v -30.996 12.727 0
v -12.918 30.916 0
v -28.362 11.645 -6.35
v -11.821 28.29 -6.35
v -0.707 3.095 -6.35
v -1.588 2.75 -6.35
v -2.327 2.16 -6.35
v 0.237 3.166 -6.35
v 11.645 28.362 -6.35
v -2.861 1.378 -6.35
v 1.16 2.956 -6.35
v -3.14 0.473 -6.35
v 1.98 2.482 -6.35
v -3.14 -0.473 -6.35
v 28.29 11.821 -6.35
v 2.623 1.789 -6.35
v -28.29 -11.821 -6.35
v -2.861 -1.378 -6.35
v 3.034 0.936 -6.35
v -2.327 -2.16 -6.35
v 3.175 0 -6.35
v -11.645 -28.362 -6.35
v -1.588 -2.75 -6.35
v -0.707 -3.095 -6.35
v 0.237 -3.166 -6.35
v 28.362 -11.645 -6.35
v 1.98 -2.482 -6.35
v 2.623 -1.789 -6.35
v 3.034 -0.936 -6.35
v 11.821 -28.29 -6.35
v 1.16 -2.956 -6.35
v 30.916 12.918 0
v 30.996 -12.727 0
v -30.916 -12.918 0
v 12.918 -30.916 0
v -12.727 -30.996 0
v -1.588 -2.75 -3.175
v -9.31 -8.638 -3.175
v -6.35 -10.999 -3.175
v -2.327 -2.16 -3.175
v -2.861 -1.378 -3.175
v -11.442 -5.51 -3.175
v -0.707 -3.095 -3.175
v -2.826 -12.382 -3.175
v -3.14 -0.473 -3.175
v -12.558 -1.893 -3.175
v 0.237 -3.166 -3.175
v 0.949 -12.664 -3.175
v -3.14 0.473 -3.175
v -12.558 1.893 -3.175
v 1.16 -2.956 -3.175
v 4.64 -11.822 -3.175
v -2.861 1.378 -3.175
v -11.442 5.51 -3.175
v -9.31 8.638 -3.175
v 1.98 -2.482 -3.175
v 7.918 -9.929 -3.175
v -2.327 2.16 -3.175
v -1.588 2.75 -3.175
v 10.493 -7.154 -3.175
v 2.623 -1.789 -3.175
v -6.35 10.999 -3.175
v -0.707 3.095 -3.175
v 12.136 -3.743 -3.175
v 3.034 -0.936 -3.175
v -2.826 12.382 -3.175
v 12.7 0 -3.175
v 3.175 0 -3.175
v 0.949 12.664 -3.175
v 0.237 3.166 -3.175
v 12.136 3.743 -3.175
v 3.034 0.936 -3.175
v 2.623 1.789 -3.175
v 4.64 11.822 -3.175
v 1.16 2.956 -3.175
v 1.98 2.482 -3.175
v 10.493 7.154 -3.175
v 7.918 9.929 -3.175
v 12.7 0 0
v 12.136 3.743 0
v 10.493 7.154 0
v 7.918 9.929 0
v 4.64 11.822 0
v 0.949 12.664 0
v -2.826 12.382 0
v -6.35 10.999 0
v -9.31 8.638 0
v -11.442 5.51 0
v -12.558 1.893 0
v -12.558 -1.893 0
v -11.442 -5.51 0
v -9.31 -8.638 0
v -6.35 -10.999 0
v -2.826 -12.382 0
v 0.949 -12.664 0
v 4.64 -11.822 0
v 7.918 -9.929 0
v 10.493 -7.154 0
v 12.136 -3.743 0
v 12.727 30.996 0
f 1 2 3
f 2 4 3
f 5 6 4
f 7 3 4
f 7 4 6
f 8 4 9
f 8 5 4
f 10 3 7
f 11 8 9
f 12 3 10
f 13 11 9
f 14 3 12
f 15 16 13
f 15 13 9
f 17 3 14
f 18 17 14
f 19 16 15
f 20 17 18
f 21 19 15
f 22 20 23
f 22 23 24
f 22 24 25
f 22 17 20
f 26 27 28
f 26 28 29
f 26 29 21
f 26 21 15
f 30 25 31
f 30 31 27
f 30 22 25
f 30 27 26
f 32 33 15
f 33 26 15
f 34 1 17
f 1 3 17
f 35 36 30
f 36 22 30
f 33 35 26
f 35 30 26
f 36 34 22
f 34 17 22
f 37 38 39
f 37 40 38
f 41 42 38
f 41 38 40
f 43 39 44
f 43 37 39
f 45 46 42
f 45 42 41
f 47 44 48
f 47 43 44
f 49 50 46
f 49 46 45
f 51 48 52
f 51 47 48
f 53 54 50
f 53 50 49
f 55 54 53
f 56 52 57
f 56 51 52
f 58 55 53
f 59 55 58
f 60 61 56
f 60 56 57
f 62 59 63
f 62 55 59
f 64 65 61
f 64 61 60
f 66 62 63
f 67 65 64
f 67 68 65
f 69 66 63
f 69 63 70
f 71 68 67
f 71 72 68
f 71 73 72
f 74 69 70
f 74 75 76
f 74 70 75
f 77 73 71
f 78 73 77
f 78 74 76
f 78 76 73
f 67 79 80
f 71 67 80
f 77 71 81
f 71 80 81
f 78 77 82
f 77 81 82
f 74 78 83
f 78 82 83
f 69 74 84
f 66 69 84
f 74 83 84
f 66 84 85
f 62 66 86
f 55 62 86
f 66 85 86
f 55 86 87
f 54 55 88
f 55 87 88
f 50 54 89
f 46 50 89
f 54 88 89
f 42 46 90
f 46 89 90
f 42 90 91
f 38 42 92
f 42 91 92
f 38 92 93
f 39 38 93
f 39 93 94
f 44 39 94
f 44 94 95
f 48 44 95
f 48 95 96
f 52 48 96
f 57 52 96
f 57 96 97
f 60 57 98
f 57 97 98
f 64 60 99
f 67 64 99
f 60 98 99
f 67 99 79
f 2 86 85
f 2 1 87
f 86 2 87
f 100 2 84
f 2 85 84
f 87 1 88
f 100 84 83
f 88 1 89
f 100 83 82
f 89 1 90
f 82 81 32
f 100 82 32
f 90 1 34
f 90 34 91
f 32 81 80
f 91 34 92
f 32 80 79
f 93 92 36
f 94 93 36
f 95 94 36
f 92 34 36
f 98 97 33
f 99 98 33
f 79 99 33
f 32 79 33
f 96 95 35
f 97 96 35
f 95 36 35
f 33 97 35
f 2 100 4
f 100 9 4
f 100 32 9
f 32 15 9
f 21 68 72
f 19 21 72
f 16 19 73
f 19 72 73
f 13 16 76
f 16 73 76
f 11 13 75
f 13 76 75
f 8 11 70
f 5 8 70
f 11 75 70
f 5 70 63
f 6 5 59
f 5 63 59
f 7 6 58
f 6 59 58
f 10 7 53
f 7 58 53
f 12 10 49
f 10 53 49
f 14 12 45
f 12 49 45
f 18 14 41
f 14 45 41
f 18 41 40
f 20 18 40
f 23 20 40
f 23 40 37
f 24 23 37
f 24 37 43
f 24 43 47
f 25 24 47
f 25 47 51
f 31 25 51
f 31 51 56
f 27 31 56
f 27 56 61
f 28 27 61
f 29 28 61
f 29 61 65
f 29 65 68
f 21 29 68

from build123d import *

# Parameters (mm, degrees)
F1_DEPTH = 6.35
F1_TAPER = 22.5
F2_R     = 12.7
F3_DEPTH = 3.175
F4_R     = 3.175
F5_DEPTH = 25.4


with BuildPart() as f1:
    # F0 (on Top) → F1 (new body)
    with BuildSketch(Plane.XY):
        Polygon((-30.9957823292, 12.7266398535), (-30.9164212153, -12.9182345311), (-12.7266398535, -30.9957823292), (12.9182345311, -30.9164212153), (30.9957823292, -12.7266398535), (30.9164212153, 12.9182345311), (12.7266398535, 30.9957823292), (-12.9182345311, 30.9164212153), align=None)
    extrude(amount=-F1_DEPTH, taper=F1_TAPER)

    # F2 (on face) → F3 (cut)
    with BuildSketch(Plane.XY):
        Circle(F2_R)
    extrude(amount=-F3_DEPTH, mode=Mode.SUBTRACT)

    # F4 (on face) → F5 (cut)
    with BuildSketch(Plane.XY.offset(-3.175)):
        Circle(F4_R)
    extrude(amount=-F5_DEPTH, mode=Mode.SUBTRACT)


solid = f1.part
